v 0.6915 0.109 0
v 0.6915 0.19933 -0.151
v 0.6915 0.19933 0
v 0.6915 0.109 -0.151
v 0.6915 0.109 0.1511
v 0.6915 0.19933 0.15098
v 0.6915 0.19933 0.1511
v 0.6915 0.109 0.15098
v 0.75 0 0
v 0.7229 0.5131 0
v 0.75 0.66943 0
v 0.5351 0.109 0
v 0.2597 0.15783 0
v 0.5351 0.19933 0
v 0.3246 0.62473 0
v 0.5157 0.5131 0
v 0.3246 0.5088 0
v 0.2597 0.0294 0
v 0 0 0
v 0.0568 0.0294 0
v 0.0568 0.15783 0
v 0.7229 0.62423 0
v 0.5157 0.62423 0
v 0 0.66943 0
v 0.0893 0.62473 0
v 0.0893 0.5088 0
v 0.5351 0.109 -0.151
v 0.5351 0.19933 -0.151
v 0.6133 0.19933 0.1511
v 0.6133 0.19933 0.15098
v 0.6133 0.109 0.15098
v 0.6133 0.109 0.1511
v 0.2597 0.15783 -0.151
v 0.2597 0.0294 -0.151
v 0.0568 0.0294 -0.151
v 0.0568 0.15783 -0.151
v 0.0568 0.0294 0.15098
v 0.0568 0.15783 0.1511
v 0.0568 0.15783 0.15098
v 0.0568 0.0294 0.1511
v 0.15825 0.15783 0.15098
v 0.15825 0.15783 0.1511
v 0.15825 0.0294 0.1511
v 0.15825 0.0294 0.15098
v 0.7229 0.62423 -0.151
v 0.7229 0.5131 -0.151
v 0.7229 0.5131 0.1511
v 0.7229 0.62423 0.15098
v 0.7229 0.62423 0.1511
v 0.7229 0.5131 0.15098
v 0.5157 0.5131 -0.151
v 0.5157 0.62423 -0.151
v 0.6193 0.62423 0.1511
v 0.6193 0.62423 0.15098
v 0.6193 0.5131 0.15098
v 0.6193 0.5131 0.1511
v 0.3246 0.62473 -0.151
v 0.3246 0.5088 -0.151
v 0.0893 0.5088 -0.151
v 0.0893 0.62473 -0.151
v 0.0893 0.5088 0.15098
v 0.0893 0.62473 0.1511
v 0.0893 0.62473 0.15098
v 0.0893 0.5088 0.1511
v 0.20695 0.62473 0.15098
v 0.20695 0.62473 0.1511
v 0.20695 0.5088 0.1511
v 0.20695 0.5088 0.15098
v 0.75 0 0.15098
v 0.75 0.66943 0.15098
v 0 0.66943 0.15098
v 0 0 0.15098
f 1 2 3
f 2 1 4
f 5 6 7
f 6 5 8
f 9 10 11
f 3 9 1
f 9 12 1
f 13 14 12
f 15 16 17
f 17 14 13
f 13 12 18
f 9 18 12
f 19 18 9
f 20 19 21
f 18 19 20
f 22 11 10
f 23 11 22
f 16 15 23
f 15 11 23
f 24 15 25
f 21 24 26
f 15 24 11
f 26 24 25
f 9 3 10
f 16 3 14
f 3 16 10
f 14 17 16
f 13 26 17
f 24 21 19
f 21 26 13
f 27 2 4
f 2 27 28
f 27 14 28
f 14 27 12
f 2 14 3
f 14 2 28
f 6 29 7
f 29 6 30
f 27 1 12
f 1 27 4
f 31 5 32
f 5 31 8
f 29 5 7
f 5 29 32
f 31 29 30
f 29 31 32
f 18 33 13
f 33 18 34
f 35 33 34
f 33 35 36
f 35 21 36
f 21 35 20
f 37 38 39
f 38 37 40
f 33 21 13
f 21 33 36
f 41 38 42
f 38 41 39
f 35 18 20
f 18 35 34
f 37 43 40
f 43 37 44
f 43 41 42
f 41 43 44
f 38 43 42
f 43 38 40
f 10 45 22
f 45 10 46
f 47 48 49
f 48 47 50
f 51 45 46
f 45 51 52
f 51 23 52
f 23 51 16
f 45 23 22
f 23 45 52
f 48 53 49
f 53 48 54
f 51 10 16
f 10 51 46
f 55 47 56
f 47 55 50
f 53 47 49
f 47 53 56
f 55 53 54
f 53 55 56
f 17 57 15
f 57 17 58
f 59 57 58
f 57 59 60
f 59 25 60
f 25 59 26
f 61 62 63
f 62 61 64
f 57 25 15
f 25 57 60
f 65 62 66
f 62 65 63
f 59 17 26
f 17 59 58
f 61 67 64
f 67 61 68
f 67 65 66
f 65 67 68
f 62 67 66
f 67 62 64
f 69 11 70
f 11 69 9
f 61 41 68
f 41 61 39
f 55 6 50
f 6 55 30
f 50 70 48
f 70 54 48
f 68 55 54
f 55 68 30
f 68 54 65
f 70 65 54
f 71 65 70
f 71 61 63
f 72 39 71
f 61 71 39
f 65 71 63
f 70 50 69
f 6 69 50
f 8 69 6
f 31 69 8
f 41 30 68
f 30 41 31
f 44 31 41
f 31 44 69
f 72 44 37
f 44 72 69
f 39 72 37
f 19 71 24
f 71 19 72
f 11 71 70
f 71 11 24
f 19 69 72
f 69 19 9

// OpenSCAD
// Parametric Base and Underside Pads
base_length = 0.75;
base_width = 0.669426;
base_height = 0.150979;
shallow_depth = 0.151;          // depth of first pad layer below base
deeper_start = 0.1509;          // distance below base underside where deeper section starts
deeper_end = 0.4529;            // distance below base underside where deeper section ends
deeper_depth = deeper_end - deeper_start; // 0.302

$fn = 100; // smoothness (not critical for flat geometry)

// Pad definition: [left_offset, right_offset, front_offset, back_offset, deeper_side]
// deeper_side: "left" means deeper pad shares left edge; "right" shares right edge.
pad_data = [
    [0.5351, 0.0585, 0.109, 0.4701, "right"], // Pad 1
    [0.0568, 0.4903, 0.0294, 0.5116, "left"],  // Pad 2
    [0.5157, 0.0271, 0.5131, 0.0452, "right"], // Pad 3
    [0.0893, 0.4254, 0.5088, 0.0447, "left"]   // Pad 4
];

// Module for a single pad with its deeper continuation
module pad_with_deeper(lx, rx, fy, by, side) {
    // Compute shallow pad dimensions
    sx = base_length - lx - rx;
    sy = base_width - fy - by;

    // Shallow pad: top at base underside (z=0), extending downward
    translate([lx, fy, -shallow_depth])
        cube([sx, sy, shallow_depth]);

    // Deeper continuation: half the X length, same Y, placed at correct side
    deep_x = sx / 2;
    deep_y = sy;
    deep_x_pos = (side == "left") ? lx : (base_length - rx - deep_x);
    deep_y_pos = fy;
    deep_z_pos = -deeper_start; // top of deeper section

    translate([deep_x_pos, deep_y_pos, deep_z_pos])
        cube([deep_x, deep_y, deeper_depth]);
}

// Main model
union() {
    // Base body
    translate([0, 0, 0])
        cube([base_length, base_width, base_height]);

    // All underside pads with deeper continuations
    for (p = pad_data) {
        pad_with_deeper(p[0], p[1], p[2], p[3], p[4]);
    }
}
